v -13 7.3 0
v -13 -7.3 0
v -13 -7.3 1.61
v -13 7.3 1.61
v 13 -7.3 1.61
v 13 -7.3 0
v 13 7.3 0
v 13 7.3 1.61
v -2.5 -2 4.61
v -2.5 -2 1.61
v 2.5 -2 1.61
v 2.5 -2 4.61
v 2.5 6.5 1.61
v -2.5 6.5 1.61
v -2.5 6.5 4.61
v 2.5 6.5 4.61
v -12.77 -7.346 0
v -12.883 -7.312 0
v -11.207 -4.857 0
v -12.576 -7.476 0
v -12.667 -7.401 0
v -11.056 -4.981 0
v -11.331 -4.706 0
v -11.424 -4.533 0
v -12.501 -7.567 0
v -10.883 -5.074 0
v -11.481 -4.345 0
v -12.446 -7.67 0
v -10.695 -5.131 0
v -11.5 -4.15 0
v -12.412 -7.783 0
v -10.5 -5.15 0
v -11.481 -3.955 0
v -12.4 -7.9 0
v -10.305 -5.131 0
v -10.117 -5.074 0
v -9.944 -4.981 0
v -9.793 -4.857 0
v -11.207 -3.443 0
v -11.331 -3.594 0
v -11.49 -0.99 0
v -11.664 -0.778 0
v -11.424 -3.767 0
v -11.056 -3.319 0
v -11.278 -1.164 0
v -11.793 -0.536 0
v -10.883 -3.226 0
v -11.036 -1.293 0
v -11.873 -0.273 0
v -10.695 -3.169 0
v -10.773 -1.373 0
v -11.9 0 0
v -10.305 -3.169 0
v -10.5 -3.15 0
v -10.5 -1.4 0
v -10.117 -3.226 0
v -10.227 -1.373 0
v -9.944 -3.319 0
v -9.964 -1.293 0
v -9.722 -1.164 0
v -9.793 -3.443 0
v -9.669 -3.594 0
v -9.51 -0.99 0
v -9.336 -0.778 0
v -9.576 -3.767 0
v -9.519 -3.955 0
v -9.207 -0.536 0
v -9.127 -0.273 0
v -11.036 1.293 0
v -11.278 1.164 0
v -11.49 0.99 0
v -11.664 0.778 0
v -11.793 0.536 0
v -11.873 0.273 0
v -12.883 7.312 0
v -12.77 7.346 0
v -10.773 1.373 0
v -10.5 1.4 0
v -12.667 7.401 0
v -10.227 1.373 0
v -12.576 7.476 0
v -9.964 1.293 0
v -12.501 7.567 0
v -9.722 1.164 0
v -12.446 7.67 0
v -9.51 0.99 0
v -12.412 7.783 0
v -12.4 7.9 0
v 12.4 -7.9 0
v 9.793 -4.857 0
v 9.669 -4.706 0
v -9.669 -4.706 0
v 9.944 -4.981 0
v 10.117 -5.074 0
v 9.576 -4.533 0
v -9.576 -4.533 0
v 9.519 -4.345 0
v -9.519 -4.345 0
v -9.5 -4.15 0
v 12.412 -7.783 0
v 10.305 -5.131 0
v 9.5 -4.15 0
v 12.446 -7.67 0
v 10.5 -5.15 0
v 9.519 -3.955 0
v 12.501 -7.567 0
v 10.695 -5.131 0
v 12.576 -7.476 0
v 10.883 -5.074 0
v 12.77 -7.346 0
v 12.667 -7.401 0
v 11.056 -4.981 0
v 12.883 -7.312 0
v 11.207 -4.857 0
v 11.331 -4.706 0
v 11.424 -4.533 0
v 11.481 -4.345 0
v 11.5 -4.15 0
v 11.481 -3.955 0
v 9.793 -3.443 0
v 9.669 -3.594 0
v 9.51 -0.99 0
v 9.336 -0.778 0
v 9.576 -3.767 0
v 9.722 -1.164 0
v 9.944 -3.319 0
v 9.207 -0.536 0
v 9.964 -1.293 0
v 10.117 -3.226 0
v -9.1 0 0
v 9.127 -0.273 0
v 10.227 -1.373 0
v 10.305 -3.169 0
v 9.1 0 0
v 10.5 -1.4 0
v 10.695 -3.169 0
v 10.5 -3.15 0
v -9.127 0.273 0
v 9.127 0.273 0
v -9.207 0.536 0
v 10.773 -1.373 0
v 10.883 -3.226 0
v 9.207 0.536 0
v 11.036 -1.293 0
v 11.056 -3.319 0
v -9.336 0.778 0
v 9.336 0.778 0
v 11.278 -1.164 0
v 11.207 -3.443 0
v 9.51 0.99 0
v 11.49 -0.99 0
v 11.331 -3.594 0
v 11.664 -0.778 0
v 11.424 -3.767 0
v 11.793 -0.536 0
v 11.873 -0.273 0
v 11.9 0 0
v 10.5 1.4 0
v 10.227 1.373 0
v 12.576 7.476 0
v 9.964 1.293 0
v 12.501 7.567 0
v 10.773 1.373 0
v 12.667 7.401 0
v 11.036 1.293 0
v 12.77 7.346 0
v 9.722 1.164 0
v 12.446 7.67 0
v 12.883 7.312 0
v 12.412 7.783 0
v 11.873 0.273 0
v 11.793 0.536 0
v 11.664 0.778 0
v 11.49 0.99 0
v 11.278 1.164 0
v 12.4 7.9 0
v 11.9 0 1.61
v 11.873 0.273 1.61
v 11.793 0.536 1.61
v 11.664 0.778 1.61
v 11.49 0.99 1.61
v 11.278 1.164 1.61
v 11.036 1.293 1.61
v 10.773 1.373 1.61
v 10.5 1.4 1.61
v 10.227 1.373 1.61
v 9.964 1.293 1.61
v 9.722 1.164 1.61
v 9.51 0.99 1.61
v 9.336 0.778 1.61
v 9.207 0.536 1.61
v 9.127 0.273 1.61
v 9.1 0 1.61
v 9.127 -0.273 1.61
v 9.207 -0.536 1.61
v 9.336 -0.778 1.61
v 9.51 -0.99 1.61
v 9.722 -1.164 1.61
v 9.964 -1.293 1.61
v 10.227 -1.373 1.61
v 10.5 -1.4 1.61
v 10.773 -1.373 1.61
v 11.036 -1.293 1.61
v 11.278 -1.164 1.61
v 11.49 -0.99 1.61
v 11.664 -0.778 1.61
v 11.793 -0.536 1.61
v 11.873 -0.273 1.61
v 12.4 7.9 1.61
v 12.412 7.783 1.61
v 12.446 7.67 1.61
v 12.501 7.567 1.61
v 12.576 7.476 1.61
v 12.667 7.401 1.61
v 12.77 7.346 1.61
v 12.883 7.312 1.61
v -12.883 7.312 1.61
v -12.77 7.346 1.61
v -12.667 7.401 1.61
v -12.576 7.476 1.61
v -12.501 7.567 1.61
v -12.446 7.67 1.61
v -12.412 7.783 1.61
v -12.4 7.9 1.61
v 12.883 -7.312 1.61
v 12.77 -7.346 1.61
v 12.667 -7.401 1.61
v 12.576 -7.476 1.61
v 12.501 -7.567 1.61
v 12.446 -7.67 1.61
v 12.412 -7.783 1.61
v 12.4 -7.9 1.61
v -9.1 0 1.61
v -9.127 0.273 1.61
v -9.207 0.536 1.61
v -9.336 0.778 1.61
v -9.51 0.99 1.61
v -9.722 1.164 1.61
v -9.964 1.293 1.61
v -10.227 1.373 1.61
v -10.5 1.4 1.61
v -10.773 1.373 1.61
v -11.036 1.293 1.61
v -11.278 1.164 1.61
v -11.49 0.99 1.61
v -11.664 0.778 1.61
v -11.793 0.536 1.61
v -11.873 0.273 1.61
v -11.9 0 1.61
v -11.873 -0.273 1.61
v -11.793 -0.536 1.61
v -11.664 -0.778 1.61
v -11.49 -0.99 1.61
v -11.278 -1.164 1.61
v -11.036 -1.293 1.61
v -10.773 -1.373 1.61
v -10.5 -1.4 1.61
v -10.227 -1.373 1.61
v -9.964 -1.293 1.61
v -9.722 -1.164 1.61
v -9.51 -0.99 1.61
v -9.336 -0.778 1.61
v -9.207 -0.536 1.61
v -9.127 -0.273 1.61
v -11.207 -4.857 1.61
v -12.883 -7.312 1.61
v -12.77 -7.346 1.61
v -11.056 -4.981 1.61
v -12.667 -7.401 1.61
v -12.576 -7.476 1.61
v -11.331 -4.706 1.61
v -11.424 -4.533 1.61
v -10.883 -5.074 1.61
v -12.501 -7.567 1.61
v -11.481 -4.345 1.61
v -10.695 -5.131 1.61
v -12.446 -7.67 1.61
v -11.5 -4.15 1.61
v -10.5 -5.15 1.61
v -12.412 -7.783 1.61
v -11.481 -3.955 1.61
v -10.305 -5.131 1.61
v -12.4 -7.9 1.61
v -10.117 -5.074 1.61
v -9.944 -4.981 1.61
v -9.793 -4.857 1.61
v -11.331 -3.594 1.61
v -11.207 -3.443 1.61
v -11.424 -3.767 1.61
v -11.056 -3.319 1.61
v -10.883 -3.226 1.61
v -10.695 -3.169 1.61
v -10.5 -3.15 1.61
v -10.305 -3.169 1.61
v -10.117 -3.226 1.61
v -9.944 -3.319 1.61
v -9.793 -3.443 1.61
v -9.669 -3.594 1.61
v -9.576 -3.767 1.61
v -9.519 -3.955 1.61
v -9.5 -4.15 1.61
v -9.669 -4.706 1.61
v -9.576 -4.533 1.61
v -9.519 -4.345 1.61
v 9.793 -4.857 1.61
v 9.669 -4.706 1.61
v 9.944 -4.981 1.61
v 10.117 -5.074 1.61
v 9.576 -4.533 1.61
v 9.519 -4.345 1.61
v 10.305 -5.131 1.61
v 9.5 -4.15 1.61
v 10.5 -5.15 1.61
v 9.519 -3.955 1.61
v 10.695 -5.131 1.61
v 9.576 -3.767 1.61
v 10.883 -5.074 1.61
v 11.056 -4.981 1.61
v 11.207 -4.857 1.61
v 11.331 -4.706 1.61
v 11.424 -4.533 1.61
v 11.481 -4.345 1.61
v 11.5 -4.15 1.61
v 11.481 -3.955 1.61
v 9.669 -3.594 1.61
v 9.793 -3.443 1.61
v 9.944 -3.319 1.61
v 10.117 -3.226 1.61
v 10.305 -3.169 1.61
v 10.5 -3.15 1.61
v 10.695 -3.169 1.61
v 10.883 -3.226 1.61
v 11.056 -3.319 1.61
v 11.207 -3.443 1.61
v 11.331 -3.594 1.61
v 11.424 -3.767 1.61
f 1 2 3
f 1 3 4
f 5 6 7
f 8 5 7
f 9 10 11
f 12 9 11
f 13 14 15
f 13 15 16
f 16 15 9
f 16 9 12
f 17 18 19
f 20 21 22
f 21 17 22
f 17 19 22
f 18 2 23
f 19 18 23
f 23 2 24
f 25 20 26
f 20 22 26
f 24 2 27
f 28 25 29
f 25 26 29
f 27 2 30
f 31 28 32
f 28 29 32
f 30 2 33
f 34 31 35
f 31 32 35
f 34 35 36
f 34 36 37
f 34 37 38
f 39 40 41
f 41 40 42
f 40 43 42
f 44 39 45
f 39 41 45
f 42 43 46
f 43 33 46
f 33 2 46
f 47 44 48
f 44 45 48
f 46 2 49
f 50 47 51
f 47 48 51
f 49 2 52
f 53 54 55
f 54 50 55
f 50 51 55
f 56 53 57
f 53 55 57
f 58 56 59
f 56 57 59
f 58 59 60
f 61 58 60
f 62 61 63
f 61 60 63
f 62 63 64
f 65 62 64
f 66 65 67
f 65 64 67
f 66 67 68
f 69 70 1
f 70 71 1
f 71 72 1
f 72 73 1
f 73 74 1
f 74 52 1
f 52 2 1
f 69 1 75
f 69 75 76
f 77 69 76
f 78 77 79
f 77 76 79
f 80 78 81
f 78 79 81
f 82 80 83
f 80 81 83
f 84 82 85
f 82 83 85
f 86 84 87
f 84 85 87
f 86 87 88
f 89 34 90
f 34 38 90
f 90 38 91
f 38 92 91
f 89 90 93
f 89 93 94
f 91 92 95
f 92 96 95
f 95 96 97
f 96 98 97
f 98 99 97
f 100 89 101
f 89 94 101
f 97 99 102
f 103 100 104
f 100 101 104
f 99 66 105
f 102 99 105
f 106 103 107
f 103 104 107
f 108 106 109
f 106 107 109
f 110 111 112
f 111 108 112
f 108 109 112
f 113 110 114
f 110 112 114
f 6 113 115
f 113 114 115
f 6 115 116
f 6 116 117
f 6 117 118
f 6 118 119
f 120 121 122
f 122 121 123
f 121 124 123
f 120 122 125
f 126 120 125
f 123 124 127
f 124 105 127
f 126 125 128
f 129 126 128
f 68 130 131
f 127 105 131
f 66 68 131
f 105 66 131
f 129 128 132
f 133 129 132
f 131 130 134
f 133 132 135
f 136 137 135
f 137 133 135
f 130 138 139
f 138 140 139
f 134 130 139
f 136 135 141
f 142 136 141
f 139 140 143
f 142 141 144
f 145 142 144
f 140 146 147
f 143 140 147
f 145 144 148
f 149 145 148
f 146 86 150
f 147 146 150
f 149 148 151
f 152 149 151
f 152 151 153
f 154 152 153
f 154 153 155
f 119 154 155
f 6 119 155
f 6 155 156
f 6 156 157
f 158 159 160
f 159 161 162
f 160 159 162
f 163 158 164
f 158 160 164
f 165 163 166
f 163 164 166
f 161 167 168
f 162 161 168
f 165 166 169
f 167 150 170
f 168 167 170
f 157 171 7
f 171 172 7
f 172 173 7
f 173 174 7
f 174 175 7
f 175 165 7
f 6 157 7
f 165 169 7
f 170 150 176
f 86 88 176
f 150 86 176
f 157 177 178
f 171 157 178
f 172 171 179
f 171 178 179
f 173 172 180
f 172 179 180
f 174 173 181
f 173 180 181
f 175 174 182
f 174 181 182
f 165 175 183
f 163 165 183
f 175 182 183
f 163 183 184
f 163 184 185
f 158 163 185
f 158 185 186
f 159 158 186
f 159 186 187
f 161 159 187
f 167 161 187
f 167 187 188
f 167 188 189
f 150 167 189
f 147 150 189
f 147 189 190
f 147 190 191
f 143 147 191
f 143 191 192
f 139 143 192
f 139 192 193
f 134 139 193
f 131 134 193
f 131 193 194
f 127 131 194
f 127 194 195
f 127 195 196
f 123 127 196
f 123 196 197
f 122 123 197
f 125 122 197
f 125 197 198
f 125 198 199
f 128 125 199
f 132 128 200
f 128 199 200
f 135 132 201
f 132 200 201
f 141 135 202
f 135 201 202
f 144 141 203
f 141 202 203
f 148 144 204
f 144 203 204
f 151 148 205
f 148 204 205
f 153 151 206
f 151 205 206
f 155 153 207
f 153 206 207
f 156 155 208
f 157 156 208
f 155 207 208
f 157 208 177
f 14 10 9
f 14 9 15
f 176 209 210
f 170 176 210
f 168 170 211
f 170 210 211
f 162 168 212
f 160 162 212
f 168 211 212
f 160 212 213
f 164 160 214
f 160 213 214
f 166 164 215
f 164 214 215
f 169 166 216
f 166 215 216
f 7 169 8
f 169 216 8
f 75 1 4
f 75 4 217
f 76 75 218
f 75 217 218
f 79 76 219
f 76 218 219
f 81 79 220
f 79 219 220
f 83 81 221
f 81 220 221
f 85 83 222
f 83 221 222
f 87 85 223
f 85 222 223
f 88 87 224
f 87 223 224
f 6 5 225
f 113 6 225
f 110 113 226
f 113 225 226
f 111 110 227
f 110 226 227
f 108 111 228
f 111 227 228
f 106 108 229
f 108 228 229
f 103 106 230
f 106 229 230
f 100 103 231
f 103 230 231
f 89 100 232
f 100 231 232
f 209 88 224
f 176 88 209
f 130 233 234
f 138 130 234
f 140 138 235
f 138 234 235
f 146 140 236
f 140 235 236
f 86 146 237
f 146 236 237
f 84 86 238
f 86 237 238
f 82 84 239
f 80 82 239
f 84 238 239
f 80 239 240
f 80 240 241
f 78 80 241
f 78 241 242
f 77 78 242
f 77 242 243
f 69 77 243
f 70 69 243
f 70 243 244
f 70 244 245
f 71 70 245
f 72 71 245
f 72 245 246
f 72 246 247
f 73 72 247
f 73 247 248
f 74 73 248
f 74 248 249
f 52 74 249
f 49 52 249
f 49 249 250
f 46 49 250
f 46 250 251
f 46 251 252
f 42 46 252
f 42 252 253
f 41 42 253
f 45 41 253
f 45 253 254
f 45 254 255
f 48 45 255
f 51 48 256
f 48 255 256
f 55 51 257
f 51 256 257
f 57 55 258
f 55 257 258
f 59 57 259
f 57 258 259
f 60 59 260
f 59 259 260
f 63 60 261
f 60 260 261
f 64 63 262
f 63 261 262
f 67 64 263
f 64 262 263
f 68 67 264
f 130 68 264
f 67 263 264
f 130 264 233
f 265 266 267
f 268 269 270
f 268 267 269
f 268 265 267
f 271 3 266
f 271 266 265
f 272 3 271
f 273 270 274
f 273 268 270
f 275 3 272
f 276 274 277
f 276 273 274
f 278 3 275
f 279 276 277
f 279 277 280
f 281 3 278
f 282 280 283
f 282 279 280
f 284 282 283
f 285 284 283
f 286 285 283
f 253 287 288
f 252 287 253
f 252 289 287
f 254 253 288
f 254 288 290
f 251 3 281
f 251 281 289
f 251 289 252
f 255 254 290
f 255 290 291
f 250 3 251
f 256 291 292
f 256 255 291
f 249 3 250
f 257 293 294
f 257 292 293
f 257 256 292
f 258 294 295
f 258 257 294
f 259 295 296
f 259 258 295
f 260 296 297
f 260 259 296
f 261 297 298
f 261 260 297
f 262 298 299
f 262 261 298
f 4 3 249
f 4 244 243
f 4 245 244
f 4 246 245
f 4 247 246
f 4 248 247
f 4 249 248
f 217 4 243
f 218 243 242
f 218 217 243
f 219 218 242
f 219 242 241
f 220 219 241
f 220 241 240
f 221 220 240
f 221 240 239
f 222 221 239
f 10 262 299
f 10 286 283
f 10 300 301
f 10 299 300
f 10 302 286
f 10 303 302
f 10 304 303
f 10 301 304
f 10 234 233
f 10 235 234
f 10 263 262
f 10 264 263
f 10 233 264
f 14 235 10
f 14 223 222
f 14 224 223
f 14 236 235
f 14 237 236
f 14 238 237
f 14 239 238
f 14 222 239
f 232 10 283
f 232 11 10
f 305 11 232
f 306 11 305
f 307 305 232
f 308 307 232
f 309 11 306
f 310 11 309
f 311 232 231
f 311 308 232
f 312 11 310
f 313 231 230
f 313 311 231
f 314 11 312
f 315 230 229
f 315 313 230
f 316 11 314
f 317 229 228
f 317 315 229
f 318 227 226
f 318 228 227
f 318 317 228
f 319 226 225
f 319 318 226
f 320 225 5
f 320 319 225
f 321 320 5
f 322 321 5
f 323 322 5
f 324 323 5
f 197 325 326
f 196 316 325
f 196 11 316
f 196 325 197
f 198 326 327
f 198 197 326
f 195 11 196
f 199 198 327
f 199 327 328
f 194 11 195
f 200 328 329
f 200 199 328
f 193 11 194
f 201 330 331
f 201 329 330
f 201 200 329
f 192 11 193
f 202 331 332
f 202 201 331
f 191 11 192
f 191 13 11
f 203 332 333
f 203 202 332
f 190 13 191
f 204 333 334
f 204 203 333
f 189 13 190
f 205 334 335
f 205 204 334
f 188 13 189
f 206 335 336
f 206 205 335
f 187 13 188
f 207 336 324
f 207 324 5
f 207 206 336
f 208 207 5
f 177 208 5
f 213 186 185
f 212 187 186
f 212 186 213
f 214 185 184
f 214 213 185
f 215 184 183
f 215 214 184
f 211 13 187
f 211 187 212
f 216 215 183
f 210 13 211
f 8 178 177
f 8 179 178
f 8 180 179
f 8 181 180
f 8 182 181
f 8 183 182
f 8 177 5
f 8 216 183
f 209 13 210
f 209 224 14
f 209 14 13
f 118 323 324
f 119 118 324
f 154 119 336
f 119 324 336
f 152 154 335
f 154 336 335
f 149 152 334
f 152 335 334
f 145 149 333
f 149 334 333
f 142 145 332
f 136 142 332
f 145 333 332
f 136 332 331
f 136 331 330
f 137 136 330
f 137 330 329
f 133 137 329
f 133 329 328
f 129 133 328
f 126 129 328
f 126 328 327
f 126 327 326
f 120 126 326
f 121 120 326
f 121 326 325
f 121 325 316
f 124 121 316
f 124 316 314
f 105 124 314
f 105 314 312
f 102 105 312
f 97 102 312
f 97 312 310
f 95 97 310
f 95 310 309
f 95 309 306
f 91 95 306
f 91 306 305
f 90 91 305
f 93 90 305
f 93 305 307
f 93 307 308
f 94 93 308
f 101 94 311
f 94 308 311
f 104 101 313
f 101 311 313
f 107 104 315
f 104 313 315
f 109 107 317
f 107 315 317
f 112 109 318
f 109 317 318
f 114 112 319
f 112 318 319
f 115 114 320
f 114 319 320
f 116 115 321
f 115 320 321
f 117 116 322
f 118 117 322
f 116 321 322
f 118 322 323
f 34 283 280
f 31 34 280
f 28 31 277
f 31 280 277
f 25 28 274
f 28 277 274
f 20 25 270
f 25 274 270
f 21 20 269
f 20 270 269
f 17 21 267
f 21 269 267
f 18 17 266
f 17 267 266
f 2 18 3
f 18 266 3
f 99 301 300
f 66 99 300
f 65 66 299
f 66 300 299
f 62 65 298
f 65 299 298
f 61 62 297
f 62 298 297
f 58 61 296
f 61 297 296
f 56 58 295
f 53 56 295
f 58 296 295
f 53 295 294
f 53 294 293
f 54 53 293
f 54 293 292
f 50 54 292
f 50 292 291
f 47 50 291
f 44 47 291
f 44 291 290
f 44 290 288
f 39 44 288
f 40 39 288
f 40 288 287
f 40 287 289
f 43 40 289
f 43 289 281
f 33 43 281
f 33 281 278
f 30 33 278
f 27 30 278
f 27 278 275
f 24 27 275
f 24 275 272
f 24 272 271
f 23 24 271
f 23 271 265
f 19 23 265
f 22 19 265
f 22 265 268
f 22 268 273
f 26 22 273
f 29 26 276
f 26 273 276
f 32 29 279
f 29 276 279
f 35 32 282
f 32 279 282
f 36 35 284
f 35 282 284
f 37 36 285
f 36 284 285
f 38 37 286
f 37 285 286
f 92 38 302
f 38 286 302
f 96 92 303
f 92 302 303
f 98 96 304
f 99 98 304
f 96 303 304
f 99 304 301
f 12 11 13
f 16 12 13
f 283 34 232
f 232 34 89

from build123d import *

# Parameters (mm, degrees)
SKETCH1_W           = 26
SKETCH1_H           = 15.8
BOSS_EXTRUDE1_DEPTH = 1.61
SKETCH2_R           = 0.6
CUT_EXTRUDE1_DEPTH  = 1.61
SKETCH3_R           = 1.4
SKETCH3_R_2         = 1
CUT_EXTRUDE2_DEPTH  = 11.61
SKETCH4_W           = 5
SKETCH4_H           = 8.5
BOSS_EXTRUDE2_DEPTH = 3


with BuildPart() as part:
    # Sketch1 → Boss-Extrude1 (new body)
    with BuildSketch(Plane.XY):
        Rectangle(SKETCH1_W, SKETCH1_H)
    extrude(amount=BOSS_EXTRUDE1_DEPTH)

    # Sketch2 → Cut-Extrude1 (cut)
    with BuildSketch(Plane.XY.offset(1.61)):
        with Locations((-13, 7.9)):
            Circle(SKETCH2_R)
        with Locations((-13, -7.9)):
            Circle(SKETCH2_R)
        with Locations((13, -7.9)):
            Circle(SKETCH2_R)
        with Locations((13, 7.9)):
            Circle(SKETCH2_R)
    extrude(amount=-CUT_EXTRUDE1_DEPTH, mode=Mode.SUBTRACT)

    # Sketch3 → Cut-Extrude2 (cut)
    with BuildSketch(Plane.XY.offset(1.61)):
        with Locations((-10.5, 0)):
            Circle(SKETCH3_R)
        with Locations((10.5, 0)):
            Circle(SKETCH3_R)
        with Locations((-10.5, -4.15)):
            Circle(SKETCH3_R_2)
        with Locations((10.5, -4.15)):
            Circle(SKETCH3_R_2)
    extrude(amount=-CUT_EXTRUDE2_DEPTH, mode=Mode.SUBTRACT)

    # Sketch4 → Boss-Extrude2 (add)
    with BuildSketch(Plane.XY.offset(1.61)):
        with Locations((0, 2.25)):
            Rectangle(SKETCH4_W, SKETCH4_H)
    extrude(amount=BOSS_EXTRUDE2_DEPTH)


solid = part.part
